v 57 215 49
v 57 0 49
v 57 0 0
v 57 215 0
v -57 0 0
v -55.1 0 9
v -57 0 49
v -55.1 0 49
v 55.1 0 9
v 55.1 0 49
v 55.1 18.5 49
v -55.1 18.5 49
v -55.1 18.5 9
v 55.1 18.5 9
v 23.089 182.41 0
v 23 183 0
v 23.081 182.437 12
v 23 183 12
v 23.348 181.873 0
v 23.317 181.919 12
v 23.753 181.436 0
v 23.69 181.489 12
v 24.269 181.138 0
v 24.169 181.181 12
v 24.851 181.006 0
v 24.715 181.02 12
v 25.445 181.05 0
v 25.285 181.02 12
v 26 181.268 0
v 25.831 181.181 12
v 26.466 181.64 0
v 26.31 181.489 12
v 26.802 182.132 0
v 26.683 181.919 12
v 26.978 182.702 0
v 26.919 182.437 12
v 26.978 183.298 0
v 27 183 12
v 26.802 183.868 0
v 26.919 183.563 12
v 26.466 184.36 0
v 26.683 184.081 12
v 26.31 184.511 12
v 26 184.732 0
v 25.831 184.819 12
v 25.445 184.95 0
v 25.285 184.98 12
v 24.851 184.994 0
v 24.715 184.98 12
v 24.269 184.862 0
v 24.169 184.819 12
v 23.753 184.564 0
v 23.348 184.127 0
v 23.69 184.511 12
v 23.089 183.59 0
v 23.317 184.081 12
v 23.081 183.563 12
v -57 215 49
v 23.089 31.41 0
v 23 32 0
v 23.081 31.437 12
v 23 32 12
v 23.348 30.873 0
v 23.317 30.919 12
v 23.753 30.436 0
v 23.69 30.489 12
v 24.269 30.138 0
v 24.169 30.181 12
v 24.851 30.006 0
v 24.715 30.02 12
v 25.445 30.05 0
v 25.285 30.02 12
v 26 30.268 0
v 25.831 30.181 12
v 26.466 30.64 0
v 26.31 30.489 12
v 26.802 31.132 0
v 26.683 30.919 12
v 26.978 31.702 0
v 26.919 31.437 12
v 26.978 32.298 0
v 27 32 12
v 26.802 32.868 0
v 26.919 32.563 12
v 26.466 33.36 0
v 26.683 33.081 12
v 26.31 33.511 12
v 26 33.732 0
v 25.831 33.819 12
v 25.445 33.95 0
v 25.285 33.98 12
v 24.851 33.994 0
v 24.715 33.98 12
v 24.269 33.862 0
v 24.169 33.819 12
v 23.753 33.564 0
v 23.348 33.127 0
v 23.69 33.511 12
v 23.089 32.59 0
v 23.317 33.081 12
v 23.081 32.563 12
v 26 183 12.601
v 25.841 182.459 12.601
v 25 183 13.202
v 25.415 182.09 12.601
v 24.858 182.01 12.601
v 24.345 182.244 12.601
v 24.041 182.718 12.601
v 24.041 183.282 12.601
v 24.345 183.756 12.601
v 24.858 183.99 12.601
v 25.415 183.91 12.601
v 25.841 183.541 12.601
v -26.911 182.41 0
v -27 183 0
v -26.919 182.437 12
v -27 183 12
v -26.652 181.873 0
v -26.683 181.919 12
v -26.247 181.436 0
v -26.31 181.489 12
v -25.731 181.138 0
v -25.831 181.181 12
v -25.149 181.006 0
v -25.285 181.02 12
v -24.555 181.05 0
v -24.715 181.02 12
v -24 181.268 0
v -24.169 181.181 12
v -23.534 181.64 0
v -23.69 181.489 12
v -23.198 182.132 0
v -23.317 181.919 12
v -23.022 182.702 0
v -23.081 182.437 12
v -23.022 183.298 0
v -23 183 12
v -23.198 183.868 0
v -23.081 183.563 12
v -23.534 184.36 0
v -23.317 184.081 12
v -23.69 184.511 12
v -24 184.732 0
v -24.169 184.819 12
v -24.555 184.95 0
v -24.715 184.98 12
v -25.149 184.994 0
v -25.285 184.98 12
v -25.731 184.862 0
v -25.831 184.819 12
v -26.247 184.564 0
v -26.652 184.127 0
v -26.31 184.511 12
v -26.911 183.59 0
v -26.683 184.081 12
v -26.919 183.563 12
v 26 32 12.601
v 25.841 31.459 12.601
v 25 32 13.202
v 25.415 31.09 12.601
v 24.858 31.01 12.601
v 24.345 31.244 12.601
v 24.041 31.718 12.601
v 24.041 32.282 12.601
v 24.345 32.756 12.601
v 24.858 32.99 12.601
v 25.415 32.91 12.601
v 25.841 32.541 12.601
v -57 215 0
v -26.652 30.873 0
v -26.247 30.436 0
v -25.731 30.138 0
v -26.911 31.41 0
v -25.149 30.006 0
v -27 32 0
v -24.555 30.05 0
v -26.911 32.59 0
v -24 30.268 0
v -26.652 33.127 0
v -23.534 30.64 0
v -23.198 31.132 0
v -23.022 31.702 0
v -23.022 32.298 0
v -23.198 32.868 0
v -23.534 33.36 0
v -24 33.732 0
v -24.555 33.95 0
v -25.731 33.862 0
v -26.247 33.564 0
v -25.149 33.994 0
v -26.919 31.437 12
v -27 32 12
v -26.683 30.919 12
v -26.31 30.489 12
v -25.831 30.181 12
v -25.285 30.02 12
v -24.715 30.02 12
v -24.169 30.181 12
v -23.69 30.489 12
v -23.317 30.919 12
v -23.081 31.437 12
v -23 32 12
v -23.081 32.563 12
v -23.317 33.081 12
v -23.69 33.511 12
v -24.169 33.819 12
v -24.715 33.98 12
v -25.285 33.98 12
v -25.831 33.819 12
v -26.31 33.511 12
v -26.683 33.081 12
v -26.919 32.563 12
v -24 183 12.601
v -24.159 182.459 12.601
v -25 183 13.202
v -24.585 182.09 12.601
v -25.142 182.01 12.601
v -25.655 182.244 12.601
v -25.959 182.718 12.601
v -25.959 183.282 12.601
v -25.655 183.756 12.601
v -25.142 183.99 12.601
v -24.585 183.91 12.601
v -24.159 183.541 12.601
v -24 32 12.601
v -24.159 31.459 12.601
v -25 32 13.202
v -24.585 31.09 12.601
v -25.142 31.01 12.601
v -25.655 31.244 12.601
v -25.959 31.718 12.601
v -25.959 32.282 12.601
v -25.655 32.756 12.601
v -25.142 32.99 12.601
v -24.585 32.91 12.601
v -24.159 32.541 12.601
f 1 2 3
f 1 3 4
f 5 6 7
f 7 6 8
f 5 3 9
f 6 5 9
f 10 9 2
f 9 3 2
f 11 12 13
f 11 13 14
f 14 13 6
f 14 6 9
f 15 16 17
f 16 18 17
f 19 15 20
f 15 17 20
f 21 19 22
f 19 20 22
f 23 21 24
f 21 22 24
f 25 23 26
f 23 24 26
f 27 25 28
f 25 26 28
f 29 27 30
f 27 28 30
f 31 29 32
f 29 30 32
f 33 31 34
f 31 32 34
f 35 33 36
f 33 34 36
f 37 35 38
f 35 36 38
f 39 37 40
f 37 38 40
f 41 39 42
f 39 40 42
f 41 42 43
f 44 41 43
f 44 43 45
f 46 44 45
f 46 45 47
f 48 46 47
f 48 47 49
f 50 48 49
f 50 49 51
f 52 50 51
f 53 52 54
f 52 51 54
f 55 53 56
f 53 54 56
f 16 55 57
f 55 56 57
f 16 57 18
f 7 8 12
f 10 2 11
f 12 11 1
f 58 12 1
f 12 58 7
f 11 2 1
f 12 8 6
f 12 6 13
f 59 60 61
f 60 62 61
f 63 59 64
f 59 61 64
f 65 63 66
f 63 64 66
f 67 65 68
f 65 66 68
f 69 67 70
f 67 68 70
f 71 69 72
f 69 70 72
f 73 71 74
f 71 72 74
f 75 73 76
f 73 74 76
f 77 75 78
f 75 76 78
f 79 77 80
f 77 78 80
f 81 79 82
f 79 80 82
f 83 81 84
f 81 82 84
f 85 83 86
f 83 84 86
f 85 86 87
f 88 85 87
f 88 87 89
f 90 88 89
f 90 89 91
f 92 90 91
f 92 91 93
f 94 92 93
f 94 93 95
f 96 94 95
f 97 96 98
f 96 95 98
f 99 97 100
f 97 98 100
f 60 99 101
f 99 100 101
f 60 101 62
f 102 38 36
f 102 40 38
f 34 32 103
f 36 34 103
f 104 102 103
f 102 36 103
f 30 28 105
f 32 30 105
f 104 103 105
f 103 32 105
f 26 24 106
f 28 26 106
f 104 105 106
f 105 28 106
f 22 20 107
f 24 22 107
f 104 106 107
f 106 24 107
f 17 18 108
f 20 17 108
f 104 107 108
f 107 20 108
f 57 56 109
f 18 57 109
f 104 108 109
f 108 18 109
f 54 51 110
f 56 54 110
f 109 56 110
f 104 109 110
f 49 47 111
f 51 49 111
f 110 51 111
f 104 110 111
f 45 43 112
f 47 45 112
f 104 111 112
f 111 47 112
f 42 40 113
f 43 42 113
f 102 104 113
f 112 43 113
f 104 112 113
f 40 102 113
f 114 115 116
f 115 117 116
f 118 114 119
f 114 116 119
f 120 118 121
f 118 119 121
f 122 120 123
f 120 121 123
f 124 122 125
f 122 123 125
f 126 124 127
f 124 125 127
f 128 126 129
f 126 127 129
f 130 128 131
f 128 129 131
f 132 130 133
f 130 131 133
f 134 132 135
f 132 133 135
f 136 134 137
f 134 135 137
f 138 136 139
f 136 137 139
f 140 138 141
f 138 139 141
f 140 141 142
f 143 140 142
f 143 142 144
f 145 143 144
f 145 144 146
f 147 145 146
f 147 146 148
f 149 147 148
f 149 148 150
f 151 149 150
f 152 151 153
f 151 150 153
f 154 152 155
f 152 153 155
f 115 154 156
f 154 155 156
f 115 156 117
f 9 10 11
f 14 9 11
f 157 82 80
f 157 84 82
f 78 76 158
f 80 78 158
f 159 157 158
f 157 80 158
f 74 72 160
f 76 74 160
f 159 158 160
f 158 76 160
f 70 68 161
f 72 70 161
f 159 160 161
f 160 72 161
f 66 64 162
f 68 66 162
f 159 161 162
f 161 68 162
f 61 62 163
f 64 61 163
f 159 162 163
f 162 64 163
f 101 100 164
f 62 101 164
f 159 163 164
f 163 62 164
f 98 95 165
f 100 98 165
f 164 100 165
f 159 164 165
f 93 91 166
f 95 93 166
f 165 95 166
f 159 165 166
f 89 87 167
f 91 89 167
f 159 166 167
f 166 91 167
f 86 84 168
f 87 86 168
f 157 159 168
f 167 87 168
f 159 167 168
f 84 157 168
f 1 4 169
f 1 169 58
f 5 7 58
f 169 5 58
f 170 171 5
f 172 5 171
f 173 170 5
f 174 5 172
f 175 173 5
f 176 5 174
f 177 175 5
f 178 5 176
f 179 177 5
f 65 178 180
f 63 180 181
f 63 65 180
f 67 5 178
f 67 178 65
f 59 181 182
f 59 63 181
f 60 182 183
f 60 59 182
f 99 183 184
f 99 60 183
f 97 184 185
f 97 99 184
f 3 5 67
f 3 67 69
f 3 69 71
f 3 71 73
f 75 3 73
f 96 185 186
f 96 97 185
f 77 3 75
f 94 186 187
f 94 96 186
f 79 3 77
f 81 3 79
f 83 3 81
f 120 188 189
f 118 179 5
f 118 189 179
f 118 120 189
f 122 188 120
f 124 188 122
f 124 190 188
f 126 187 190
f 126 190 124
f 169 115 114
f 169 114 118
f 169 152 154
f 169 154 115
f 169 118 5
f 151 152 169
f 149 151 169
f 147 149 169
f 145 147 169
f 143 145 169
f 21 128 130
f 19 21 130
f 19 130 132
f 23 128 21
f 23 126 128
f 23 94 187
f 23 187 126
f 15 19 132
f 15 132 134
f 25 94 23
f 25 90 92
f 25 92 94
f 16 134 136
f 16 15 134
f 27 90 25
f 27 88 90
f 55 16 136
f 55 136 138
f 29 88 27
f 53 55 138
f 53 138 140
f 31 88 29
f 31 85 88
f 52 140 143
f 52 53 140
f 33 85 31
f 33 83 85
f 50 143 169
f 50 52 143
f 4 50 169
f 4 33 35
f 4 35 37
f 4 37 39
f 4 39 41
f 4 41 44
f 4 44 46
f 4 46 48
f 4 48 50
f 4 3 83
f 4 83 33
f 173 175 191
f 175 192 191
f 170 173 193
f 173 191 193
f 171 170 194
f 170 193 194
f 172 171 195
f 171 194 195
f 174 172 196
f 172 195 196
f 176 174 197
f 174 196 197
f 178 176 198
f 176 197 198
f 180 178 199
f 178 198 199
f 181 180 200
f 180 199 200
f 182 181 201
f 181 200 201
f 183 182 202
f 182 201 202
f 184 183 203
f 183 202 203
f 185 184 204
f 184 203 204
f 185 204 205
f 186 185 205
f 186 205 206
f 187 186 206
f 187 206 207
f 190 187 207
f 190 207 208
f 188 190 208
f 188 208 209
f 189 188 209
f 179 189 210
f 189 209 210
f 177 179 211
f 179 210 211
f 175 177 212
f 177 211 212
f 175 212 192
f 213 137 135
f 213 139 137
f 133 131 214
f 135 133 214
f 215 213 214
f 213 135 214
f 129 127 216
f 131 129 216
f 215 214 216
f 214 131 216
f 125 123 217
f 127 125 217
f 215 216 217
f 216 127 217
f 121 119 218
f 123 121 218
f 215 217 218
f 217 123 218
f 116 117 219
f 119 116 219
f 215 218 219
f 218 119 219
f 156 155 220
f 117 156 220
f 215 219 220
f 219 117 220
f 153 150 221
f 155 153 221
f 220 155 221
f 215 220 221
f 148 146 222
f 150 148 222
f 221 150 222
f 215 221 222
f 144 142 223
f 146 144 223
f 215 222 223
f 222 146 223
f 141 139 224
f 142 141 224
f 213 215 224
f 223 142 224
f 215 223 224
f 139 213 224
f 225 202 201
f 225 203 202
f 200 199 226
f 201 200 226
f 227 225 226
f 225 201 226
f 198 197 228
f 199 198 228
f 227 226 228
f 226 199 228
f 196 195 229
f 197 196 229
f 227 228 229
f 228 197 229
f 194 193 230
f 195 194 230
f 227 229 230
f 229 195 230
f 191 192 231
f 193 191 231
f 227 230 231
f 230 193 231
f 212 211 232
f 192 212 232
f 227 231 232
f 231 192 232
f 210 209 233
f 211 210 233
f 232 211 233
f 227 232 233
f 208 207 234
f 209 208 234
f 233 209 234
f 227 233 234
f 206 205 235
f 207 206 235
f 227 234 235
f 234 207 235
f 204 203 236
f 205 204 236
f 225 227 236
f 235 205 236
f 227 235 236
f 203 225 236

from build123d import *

# Parameters (mm, degrees)
F0_W     = 215
F0_H     = 49
F1_DEPTH = 57
F2_W     = 110.2
F2_H     = 18.5
F3_DEPTH = 40
F5_D     = 4
F5_DEPTH = 12
F5_TIP   = 1.2017212381


with BuildPart() as f1:
    # F0 (on Right) → F1 (new body, symmetric)
    with BuildSketch(Plane.YZ):
        with Locations((107.5, 24.5)):
            Rectangle(F0_W, F0_H)
    extrude(amount=F1_DEPTH, both=True)

    # F2 (on face) → F3 (cut)
    with BuildSketch(Plane.XY.offset(49)):
        with Locations((0, 9.25)):
            Rectangle(F2_W, F2_H)
    extrude(amount=-F3_DEPTH, mode=Mode.SUBTRACT)

    # F5
    with Locations(Plane(origin=(0, 0, 0), x_dir=(1, 0, 0), z_dir=(0, 0, -1))):
        with Locations((25, -32), (25, -183), (-25, -183), (-25, -32)):
            Hole(F5_D / 2, depth=F5_DEPTH)
            with Locations((0, 0, -(F5_DEPTH + F5_TIP / 2))):  # 118° drill point
                Cone(0, F5_D / 2, F5_TIP, mode=Mode.SUBTRACT)


solid = f1.part
